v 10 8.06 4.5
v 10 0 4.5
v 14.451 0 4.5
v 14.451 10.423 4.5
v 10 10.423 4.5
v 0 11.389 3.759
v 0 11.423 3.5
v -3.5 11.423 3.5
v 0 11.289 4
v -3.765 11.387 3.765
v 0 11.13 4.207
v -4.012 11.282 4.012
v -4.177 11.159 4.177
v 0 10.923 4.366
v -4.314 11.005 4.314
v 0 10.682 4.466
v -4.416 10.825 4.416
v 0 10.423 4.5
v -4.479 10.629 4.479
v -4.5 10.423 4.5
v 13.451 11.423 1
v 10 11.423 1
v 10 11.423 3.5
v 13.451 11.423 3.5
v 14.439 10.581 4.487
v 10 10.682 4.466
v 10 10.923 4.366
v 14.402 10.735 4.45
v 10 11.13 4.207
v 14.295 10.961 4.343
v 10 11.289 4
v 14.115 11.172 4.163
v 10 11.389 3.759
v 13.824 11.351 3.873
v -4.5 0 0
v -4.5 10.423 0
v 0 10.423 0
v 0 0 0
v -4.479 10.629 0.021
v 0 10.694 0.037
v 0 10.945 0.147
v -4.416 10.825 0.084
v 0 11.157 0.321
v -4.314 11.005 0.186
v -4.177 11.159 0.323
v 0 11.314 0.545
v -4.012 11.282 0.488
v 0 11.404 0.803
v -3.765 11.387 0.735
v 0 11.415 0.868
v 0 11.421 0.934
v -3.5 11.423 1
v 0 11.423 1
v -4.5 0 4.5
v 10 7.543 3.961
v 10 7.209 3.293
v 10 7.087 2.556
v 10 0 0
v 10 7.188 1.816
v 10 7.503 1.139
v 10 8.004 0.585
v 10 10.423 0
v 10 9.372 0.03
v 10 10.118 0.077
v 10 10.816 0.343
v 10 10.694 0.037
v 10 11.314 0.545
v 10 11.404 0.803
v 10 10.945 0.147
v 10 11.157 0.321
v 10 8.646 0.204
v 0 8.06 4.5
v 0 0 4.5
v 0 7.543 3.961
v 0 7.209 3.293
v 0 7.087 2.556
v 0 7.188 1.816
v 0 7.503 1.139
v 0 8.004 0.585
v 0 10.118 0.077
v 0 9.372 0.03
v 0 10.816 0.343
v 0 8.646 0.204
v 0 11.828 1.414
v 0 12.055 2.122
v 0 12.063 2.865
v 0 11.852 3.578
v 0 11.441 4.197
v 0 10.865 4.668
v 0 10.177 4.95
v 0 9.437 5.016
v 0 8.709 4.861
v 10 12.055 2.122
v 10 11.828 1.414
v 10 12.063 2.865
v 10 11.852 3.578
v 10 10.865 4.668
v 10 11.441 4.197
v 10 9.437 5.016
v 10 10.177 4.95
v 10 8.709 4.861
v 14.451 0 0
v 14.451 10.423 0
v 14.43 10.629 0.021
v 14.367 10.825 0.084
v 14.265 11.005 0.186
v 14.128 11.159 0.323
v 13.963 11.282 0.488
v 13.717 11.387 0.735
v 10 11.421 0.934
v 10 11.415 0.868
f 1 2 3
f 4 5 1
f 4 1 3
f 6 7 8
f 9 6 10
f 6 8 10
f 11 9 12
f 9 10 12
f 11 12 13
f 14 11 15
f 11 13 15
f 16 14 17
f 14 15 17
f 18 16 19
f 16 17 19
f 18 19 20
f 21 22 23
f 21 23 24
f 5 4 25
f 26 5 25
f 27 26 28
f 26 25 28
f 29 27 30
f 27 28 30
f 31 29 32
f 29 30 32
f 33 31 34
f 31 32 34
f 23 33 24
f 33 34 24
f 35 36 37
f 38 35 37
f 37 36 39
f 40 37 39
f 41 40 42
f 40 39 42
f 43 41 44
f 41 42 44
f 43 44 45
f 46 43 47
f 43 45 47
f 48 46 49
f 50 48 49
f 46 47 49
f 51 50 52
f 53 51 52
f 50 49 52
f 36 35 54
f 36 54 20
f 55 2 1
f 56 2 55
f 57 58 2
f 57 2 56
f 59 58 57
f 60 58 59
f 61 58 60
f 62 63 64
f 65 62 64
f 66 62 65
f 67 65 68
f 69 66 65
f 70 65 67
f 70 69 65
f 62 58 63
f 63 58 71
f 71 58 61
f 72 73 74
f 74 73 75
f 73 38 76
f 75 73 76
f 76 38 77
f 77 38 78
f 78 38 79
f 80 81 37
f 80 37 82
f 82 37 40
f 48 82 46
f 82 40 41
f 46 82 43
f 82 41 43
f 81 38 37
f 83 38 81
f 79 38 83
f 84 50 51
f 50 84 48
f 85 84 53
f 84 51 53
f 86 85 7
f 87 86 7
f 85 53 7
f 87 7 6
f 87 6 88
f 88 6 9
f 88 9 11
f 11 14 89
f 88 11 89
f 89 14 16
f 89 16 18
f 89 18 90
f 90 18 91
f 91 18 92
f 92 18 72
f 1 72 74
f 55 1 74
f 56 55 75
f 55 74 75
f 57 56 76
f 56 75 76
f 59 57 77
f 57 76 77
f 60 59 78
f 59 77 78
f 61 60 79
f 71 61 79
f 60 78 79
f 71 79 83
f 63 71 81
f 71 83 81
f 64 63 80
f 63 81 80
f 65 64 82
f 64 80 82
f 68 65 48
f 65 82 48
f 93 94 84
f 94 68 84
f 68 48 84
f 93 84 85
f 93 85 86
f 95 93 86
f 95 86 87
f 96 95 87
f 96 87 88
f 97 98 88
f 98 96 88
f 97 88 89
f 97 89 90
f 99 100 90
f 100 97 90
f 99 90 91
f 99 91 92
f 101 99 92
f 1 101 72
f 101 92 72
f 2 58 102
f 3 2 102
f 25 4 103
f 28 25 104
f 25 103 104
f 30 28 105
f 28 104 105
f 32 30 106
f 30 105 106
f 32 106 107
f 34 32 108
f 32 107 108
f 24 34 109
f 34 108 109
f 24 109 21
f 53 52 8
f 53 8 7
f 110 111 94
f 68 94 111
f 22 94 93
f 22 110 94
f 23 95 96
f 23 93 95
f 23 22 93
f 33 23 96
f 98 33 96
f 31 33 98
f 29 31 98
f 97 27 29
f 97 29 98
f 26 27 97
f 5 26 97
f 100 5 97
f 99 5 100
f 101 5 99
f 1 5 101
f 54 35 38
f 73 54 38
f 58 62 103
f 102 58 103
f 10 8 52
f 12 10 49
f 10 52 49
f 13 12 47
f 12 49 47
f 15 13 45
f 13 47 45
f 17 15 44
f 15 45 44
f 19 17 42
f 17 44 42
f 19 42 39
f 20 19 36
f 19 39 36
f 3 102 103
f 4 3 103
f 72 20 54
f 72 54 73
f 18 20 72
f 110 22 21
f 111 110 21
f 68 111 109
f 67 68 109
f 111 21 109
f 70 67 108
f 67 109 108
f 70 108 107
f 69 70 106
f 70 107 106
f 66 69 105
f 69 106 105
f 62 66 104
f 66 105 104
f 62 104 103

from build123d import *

# Parameters (mm, degrees)
SKIZZE1_W                         = 4.5
SKIZZE1_H                         = 11.423295
AUFSATZ_LINEAR_AUSTRAGEN1_DEPTH   = 4.5
SKIZZE1_W_2                       = 4.451373
AUFSATZ_LINEAR_AUSTRAGEN1_2_DEPTH = 4.5
SKIZZE2_R                         = 2.5
AUFSATZ_LINEAR_AUSTRAGEN2_DEPTH   = 10
VERRUNDUNG4_R                     = 1


with BuildPart() as part:
    # Skizze1 → Aufsatz-Linear austragen1 (new body)
    with BuildSketch(Plane.XY):
        with Locations((-2.25, 5.7116475)):
            Rectangle(SKIZZE1_W, SKIZZE1_H)
    extrude(amount=AUFSATZ_LINEAR_AUSTRAGEN1_DEPTH)



with BuildPart() as body_2:
    # Skizze1 → Aufsatz-Linear austragen1 2 (new body)
    with BuildSketch(Plane.XY):
        with Locations((12.2256865, 5.7116475)):
            Rectangle(SKIZZE1_W_2, SKIZZE1_H)
    extrude(amount=AUFSATZ_LINEAR_AUSTRAGEN1_2_DEPTH)


with BuildPart() as part_1:
    add(part.part)

    add(body_2.part)  # Aufsatz-Linear austragen2 merges body 2
    # Skizze2 → Aufsatz-Linear austragen2 (add)
    with BuildSketch(Plane(origin=(0, 0, 0), x_dir=(0, 0, -1), z_dir=(1, 0, 0))):
        with Locations(Location((-2.520313205, 9.586549386, 0), (0, 0, 217.638946457))):
            Circle(SKIZZE2_R)
    extrude(amount=AUFSATZ_LINEAR_AUSTRAGEN2_DEPTH)

    # Verrundung4
    # the kernel refuses this fillet: 1 mm, written as the material it takes off along each edge
    with BuildSketch(Plane(origin=(16.951373, 11.423295, 0), x_dir=(0, 0, 1), z_dir=(-1, 0, 0)), Plane(origin=(16.951373, 11.423295, 4.5), x_dir=(0, -1, 0), z_dir=(-1, 0, 0))) as verrundung4_piece_1:
        with BuildLine():
            CenterArc((VERRUNDUNG4_R, -VERRUNDUNG4_R), VERRUNDUNG4_R, 90, 90)
            Line((0, -VERRUNDUNG4_R), (0, 0))
            Line((0, 0), (VERRUNDUNG4_R, 0))
        make_face()
    extrude(amount=6.951373, mode=Mode.SUBTRACT)
    with BuildSketch(Plane(origin=(14.451373, 11.423295, -2.5), x_dir=(-1, 0, 0), z_dir=(0, 0, 1)), Plane(origin=(-4.5, 11.423295, -2.5), x_dir=(0, -1, 0), z_dir=(0, 0, 1))) as verrundung4_piece_2:
        with BuildLine():
            CenterArc((VERRUNDUNG4_R, VERRUNDUNG4_R), VERRUNDUNG4_R, 180, 90)
            Line((0, VERRUNDUNG4_R), (0, 0))
            Line((0, 0), (VERRUNDUNG4_R, 0))
        make_face()
    extrude(amount=9.5, mode=Mode.SUBTRACT)
    with BuildSketch(Plane(origin=(-7, 11.423295, 0), x_dir=(0, -1, 0), z_dir=(1, 0, 0))) as verrundung4_piece_3:
        with BuildLine():
            CenterArc((VERRUNDUNG4_R, -VERRUNDUNG4_R), VERRUNDUNG4_R, 90, 90)
            Line((0, -VERRUNDUNG4_R), (0, 0))
            Line((0, 0), (VERRUNDUNG4_R, 0))
        make_face()
    extrude(amount=7, mode=Mode.SUBTRACT)
    with BuildSketch(Plane(origin=(-7, 11.423295, 4.5), x_dir=(0, -1, 0), z_dir=(1, 0, 0))) as verrundung4_piece_4:
        with BuildLine():
            CenterArc((VERRUNDUNG4_R, VERRUNDUNG4_R), VERRUNDUNG4_R, 180, 90)
            Line((0, VERRUNDUNG4_R), (0, 0))
            Line((0, 0), (VERRUNDUNG4_R, 0))
        make_face()
    extrude(amount=7, mode=Mode.SUBTRACT)


solid = part_1.part
